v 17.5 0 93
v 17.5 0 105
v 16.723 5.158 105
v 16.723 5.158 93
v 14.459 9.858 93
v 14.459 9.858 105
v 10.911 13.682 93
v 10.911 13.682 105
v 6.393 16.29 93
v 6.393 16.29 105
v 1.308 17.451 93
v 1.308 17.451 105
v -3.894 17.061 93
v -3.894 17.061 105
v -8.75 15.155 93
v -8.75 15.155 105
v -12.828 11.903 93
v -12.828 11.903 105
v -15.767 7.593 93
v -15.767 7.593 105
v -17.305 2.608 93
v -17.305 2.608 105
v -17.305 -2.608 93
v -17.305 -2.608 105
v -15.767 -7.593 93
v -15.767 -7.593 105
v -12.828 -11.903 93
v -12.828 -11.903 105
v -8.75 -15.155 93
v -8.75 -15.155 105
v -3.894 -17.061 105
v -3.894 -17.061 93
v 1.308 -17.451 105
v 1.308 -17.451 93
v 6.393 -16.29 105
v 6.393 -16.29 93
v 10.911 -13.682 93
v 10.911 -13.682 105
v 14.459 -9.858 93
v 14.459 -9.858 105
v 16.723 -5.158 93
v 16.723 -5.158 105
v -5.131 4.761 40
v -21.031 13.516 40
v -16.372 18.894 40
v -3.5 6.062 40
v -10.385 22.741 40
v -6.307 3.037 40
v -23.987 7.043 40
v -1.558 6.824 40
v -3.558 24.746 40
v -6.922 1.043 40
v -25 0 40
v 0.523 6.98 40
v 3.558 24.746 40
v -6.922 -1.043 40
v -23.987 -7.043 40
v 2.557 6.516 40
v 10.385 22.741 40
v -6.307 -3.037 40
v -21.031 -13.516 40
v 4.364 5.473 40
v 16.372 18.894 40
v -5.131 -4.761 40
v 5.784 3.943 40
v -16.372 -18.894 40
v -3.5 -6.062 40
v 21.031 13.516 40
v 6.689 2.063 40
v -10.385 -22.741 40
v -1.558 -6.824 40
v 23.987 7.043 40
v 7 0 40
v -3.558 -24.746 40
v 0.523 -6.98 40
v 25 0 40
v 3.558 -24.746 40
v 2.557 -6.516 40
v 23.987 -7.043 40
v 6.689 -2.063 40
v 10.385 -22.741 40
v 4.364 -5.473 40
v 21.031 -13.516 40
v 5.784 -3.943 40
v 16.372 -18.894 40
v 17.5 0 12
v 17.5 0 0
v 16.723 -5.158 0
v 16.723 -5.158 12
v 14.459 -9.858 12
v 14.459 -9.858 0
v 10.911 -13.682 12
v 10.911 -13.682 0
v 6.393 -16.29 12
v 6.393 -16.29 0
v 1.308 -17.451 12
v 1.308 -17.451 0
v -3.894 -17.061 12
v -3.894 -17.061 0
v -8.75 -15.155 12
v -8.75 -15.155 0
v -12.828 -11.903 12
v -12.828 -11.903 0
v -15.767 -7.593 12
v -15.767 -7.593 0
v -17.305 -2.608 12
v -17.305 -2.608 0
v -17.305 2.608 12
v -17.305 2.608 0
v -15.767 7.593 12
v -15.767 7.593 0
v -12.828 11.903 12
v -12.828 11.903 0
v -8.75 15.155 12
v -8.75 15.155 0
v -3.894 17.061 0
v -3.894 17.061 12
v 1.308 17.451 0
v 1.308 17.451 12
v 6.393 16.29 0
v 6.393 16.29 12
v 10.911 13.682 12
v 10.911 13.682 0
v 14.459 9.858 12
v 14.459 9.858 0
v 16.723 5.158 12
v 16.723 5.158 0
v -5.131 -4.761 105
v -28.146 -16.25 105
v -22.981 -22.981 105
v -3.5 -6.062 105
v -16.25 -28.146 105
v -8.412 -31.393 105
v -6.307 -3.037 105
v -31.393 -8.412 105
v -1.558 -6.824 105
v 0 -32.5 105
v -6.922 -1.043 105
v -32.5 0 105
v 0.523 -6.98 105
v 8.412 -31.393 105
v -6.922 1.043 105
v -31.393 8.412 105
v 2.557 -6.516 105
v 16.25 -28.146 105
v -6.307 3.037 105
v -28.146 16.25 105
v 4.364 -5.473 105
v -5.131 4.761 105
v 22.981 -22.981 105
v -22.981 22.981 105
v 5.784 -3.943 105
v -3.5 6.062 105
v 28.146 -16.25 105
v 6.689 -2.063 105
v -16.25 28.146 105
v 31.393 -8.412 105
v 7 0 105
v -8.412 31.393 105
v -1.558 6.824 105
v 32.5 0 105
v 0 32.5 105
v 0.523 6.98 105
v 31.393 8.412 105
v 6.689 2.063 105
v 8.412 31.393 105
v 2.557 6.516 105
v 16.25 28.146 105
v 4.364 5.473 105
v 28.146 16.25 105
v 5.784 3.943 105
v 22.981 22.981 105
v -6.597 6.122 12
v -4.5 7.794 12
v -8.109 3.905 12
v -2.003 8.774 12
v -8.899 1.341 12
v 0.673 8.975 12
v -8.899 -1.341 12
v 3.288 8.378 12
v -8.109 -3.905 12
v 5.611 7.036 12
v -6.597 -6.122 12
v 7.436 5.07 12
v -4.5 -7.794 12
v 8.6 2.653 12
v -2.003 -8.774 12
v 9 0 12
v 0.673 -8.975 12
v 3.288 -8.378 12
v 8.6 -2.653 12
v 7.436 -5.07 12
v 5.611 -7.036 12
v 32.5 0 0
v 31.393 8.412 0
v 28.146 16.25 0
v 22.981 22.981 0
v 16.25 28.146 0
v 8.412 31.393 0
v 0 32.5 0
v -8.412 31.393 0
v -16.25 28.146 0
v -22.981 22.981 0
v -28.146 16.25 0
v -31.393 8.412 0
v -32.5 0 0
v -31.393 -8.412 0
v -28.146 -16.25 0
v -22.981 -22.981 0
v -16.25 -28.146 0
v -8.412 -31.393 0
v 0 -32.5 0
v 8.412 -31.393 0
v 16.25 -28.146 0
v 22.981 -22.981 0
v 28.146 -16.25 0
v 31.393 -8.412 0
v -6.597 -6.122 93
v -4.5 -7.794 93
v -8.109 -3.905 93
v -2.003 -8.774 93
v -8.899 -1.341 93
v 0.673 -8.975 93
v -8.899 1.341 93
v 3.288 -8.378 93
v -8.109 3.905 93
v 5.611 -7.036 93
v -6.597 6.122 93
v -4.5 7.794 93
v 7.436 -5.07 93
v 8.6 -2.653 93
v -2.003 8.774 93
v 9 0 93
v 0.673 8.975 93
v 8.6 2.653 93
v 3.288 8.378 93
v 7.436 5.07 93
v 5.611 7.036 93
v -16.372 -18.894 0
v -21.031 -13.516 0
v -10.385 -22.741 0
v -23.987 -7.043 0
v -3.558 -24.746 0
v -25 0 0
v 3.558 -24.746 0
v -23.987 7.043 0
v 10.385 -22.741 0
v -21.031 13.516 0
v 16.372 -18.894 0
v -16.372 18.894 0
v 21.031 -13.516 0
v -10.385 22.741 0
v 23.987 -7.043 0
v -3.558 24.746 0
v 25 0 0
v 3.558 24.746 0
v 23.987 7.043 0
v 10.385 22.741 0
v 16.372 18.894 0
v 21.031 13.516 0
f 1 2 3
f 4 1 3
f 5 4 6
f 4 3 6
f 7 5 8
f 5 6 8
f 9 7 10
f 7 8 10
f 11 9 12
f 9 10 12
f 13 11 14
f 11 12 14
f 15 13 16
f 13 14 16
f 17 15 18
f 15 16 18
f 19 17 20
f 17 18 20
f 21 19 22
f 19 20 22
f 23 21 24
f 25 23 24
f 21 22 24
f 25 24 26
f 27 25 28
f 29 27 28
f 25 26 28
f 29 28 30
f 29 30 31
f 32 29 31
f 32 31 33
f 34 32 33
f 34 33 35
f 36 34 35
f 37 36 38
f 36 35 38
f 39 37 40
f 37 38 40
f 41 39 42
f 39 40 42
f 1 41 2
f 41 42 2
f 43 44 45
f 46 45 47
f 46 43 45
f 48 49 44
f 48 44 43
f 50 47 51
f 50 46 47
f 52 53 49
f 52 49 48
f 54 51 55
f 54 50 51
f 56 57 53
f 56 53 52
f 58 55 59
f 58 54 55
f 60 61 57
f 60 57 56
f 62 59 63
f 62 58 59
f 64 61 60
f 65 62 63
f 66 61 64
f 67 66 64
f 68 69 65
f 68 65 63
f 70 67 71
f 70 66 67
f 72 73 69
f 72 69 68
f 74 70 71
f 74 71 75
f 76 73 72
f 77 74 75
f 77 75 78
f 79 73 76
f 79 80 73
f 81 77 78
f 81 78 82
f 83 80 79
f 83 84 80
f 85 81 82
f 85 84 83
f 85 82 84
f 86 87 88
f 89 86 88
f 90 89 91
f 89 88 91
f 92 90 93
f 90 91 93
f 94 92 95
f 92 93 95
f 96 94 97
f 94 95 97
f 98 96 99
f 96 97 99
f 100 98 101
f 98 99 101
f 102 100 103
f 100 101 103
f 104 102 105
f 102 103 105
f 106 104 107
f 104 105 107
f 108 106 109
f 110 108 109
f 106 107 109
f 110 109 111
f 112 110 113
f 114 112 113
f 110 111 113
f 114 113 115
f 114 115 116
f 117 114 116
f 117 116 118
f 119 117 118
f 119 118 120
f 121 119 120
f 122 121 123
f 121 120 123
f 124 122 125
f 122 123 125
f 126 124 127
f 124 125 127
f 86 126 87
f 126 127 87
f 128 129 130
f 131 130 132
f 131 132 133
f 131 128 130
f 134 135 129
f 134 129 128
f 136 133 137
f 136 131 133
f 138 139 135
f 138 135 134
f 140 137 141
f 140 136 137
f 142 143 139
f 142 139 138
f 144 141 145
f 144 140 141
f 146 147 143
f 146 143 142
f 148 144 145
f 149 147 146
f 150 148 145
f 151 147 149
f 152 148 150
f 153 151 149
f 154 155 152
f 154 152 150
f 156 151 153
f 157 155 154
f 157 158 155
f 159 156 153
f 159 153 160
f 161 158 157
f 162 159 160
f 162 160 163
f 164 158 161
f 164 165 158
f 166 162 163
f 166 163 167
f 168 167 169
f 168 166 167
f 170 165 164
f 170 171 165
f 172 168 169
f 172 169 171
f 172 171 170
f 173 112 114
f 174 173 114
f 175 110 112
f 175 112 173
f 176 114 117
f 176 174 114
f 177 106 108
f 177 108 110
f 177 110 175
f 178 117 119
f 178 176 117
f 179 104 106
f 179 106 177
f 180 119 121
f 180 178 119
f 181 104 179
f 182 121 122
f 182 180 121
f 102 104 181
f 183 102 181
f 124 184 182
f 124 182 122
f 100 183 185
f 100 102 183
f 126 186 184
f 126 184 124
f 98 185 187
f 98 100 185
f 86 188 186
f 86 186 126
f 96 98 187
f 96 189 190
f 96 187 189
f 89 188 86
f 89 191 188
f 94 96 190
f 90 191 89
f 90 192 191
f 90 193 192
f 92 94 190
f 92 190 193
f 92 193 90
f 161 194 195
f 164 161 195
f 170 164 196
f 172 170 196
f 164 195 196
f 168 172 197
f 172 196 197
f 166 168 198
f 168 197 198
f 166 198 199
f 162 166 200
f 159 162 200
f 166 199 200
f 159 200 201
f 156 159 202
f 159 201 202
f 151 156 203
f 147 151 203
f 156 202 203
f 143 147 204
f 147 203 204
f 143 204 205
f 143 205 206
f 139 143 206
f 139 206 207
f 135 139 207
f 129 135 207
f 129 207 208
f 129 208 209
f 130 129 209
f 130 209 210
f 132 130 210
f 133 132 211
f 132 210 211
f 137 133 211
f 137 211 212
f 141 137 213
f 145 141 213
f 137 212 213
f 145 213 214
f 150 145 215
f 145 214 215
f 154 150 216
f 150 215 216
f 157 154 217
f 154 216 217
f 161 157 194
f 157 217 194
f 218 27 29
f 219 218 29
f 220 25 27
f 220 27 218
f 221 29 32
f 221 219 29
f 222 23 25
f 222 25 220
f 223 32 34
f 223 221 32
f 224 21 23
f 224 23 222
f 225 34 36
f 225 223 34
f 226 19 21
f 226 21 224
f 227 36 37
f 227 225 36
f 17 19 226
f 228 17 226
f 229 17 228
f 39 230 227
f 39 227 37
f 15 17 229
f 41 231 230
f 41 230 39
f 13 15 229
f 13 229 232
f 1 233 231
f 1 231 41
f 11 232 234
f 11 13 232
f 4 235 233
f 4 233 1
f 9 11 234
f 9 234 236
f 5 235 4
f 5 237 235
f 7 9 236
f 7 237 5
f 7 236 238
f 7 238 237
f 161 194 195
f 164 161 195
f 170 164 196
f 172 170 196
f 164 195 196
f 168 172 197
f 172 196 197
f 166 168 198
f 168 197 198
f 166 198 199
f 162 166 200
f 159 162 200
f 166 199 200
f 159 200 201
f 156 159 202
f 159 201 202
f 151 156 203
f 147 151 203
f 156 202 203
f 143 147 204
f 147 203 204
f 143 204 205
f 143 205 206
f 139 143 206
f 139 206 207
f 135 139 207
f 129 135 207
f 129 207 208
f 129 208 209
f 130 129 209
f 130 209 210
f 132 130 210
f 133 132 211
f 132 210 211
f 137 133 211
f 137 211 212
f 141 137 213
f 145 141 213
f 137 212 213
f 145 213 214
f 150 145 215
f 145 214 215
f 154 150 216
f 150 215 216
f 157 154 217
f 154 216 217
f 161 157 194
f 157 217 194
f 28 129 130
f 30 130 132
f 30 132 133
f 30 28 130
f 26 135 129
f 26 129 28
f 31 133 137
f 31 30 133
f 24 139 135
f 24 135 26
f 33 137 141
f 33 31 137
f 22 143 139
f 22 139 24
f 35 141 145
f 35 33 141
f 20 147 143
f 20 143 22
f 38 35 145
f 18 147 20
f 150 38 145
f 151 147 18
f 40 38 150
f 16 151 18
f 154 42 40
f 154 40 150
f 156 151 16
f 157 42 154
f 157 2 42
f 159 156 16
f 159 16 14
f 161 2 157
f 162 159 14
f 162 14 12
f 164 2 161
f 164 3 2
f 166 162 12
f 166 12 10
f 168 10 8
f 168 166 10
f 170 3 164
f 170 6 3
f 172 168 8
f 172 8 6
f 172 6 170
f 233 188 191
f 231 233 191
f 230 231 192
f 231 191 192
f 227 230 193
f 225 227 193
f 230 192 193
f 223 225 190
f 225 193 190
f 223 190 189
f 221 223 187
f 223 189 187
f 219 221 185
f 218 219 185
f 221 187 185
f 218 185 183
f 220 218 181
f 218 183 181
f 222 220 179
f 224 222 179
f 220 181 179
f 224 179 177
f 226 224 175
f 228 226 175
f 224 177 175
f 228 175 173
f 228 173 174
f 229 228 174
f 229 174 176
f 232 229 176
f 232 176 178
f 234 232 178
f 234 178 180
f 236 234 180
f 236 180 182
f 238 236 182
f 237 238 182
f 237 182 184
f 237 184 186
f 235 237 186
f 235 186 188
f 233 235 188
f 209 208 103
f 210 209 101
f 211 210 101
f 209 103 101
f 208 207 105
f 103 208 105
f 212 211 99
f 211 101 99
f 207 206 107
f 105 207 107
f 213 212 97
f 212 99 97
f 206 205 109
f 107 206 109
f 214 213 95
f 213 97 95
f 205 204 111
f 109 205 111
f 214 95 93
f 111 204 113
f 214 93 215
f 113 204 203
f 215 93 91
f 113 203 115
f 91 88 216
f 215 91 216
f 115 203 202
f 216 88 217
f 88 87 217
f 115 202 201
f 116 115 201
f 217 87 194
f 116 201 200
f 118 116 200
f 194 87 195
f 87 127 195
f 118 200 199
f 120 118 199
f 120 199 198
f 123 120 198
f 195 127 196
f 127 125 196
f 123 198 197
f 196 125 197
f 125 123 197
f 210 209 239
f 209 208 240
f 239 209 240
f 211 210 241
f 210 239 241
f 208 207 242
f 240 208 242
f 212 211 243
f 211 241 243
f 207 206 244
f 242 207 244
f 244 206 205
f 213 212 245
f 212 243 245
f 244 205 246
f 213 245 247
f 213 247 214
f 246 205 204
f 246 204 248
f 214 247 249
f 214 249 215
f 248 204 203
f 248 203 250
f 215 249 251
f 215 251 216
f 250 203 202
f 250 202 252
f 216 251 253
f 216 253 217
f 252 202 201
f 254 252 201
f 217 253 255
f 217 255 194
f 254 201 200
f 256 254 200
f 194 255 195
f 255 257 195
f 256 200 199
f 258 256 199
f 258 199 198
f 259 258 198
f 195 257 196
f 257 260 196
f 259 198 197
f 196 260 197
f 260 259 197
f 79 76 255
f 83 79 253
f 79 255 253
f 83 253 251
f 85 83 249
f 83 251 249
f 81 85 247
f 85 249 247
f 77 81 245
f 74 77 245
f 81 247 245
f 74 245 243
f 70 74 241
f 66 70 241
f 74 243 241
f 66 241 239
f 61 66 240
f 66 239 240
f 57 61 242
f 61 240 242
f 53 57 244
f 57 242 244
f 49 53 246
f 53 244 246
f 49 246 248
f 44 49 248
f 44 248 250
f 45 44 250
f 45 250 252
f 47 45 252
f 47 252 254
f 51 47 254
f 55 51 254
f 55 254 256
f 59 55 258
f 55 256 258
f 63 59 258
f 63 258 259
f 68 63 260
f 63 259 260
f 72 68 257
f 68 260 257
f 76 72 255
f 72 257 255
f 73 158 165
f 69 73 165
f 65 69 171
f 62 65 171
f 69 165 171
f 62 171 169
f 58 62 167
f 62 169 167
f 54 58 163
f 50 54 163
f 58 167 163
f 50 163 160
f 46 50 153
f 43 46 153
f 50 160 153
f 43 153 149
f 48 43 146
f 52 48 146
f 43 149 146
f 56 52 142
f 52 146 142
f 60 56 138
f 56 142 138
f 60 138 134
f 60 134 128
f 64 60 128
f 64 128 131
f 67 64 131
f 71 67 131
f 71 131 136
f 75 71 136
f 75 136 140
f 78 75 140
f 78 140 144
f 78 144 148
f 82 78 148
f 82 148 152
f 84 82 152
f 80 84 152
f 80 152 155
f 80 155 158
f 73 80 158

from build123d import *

# Parameters (mm, degrees)
F0_R      = 32.5
F1_DEPTH  = 105
F2_R      = 7
F3_DEPTH  = 110
F4_R      = 25
F5_DEPTH  = 40
F7_DEPTH  = 105
F8_R      = 9
F9_DEPTH  = 105
F10_R     = 17.5
F10_R_2   = 9
F11_DEPTH = 12
F12_R     = 17.5
F13_DEPTH = 12


with BuildPart() as f1:
    # F0 (on Top) → F1 (new body)
    with BuildSketch(Plane.XY):
        Circle(F0_R)
    extrude(amount=F1_DEPTH)

    # F2 (on face) → F3 (cut)
    with BuildSketch(Plane.XY.offset(105)):
        Circle(F2_R)
    extrude(amount=-F3_DEPTH, mode=Mode.SUBTRACT)

    # F4 (on face) → F5 (cut)
    with BuildSketch(Plane(origin=(0, 0, 0), x_dir=(1, 0, 0), z_dir=(0, 0, -1))):
        Circle(F4_R)
    extrude(amount=-F5_DEPTH, mode=Mode.SUBTRACT)


with BuildPart() as f7:
    # F0 (on Top) → F7 (new body)
    with BuildSketch(Plane.XY):
        Circle(F0_R)
    extrude(amount=F7_DEPTH)

    # F8 (on face) → F9 (cut)
    with BuildSketch(Plane(origin=(0, 0, 0), x_dir=(1, 0, 0), z_dir=(0, 0, -1))):
        Circle(F8_R)
    extrude(amount=-F9_DEPTH, mode=Mode.SUBTRACT)

    # F10 (on face) → F11 (cut)
    with BuildSketch(Plane(origin=(0, 0, 0), x_dir=(1, 0, 0), z_dir=(0, 0, -1))):
        Circle(F10_R)
        Circle(F10_R_2, mode=Mode.SUBTRACT)
        Circle(F10_R)
    extrude(amount=-F11_DEPTH, mode=Mode.SUBTRACT)

    # F12 (on face) → F13 (cut)
    with BuildSketch(Plane.XY.offset(105)):
        Circle(F12_R)
    extrude(amount=-F13_DEPTH, mode=Mode.SUBTRACT)


solid = Compound([f1.part, f7.part])
